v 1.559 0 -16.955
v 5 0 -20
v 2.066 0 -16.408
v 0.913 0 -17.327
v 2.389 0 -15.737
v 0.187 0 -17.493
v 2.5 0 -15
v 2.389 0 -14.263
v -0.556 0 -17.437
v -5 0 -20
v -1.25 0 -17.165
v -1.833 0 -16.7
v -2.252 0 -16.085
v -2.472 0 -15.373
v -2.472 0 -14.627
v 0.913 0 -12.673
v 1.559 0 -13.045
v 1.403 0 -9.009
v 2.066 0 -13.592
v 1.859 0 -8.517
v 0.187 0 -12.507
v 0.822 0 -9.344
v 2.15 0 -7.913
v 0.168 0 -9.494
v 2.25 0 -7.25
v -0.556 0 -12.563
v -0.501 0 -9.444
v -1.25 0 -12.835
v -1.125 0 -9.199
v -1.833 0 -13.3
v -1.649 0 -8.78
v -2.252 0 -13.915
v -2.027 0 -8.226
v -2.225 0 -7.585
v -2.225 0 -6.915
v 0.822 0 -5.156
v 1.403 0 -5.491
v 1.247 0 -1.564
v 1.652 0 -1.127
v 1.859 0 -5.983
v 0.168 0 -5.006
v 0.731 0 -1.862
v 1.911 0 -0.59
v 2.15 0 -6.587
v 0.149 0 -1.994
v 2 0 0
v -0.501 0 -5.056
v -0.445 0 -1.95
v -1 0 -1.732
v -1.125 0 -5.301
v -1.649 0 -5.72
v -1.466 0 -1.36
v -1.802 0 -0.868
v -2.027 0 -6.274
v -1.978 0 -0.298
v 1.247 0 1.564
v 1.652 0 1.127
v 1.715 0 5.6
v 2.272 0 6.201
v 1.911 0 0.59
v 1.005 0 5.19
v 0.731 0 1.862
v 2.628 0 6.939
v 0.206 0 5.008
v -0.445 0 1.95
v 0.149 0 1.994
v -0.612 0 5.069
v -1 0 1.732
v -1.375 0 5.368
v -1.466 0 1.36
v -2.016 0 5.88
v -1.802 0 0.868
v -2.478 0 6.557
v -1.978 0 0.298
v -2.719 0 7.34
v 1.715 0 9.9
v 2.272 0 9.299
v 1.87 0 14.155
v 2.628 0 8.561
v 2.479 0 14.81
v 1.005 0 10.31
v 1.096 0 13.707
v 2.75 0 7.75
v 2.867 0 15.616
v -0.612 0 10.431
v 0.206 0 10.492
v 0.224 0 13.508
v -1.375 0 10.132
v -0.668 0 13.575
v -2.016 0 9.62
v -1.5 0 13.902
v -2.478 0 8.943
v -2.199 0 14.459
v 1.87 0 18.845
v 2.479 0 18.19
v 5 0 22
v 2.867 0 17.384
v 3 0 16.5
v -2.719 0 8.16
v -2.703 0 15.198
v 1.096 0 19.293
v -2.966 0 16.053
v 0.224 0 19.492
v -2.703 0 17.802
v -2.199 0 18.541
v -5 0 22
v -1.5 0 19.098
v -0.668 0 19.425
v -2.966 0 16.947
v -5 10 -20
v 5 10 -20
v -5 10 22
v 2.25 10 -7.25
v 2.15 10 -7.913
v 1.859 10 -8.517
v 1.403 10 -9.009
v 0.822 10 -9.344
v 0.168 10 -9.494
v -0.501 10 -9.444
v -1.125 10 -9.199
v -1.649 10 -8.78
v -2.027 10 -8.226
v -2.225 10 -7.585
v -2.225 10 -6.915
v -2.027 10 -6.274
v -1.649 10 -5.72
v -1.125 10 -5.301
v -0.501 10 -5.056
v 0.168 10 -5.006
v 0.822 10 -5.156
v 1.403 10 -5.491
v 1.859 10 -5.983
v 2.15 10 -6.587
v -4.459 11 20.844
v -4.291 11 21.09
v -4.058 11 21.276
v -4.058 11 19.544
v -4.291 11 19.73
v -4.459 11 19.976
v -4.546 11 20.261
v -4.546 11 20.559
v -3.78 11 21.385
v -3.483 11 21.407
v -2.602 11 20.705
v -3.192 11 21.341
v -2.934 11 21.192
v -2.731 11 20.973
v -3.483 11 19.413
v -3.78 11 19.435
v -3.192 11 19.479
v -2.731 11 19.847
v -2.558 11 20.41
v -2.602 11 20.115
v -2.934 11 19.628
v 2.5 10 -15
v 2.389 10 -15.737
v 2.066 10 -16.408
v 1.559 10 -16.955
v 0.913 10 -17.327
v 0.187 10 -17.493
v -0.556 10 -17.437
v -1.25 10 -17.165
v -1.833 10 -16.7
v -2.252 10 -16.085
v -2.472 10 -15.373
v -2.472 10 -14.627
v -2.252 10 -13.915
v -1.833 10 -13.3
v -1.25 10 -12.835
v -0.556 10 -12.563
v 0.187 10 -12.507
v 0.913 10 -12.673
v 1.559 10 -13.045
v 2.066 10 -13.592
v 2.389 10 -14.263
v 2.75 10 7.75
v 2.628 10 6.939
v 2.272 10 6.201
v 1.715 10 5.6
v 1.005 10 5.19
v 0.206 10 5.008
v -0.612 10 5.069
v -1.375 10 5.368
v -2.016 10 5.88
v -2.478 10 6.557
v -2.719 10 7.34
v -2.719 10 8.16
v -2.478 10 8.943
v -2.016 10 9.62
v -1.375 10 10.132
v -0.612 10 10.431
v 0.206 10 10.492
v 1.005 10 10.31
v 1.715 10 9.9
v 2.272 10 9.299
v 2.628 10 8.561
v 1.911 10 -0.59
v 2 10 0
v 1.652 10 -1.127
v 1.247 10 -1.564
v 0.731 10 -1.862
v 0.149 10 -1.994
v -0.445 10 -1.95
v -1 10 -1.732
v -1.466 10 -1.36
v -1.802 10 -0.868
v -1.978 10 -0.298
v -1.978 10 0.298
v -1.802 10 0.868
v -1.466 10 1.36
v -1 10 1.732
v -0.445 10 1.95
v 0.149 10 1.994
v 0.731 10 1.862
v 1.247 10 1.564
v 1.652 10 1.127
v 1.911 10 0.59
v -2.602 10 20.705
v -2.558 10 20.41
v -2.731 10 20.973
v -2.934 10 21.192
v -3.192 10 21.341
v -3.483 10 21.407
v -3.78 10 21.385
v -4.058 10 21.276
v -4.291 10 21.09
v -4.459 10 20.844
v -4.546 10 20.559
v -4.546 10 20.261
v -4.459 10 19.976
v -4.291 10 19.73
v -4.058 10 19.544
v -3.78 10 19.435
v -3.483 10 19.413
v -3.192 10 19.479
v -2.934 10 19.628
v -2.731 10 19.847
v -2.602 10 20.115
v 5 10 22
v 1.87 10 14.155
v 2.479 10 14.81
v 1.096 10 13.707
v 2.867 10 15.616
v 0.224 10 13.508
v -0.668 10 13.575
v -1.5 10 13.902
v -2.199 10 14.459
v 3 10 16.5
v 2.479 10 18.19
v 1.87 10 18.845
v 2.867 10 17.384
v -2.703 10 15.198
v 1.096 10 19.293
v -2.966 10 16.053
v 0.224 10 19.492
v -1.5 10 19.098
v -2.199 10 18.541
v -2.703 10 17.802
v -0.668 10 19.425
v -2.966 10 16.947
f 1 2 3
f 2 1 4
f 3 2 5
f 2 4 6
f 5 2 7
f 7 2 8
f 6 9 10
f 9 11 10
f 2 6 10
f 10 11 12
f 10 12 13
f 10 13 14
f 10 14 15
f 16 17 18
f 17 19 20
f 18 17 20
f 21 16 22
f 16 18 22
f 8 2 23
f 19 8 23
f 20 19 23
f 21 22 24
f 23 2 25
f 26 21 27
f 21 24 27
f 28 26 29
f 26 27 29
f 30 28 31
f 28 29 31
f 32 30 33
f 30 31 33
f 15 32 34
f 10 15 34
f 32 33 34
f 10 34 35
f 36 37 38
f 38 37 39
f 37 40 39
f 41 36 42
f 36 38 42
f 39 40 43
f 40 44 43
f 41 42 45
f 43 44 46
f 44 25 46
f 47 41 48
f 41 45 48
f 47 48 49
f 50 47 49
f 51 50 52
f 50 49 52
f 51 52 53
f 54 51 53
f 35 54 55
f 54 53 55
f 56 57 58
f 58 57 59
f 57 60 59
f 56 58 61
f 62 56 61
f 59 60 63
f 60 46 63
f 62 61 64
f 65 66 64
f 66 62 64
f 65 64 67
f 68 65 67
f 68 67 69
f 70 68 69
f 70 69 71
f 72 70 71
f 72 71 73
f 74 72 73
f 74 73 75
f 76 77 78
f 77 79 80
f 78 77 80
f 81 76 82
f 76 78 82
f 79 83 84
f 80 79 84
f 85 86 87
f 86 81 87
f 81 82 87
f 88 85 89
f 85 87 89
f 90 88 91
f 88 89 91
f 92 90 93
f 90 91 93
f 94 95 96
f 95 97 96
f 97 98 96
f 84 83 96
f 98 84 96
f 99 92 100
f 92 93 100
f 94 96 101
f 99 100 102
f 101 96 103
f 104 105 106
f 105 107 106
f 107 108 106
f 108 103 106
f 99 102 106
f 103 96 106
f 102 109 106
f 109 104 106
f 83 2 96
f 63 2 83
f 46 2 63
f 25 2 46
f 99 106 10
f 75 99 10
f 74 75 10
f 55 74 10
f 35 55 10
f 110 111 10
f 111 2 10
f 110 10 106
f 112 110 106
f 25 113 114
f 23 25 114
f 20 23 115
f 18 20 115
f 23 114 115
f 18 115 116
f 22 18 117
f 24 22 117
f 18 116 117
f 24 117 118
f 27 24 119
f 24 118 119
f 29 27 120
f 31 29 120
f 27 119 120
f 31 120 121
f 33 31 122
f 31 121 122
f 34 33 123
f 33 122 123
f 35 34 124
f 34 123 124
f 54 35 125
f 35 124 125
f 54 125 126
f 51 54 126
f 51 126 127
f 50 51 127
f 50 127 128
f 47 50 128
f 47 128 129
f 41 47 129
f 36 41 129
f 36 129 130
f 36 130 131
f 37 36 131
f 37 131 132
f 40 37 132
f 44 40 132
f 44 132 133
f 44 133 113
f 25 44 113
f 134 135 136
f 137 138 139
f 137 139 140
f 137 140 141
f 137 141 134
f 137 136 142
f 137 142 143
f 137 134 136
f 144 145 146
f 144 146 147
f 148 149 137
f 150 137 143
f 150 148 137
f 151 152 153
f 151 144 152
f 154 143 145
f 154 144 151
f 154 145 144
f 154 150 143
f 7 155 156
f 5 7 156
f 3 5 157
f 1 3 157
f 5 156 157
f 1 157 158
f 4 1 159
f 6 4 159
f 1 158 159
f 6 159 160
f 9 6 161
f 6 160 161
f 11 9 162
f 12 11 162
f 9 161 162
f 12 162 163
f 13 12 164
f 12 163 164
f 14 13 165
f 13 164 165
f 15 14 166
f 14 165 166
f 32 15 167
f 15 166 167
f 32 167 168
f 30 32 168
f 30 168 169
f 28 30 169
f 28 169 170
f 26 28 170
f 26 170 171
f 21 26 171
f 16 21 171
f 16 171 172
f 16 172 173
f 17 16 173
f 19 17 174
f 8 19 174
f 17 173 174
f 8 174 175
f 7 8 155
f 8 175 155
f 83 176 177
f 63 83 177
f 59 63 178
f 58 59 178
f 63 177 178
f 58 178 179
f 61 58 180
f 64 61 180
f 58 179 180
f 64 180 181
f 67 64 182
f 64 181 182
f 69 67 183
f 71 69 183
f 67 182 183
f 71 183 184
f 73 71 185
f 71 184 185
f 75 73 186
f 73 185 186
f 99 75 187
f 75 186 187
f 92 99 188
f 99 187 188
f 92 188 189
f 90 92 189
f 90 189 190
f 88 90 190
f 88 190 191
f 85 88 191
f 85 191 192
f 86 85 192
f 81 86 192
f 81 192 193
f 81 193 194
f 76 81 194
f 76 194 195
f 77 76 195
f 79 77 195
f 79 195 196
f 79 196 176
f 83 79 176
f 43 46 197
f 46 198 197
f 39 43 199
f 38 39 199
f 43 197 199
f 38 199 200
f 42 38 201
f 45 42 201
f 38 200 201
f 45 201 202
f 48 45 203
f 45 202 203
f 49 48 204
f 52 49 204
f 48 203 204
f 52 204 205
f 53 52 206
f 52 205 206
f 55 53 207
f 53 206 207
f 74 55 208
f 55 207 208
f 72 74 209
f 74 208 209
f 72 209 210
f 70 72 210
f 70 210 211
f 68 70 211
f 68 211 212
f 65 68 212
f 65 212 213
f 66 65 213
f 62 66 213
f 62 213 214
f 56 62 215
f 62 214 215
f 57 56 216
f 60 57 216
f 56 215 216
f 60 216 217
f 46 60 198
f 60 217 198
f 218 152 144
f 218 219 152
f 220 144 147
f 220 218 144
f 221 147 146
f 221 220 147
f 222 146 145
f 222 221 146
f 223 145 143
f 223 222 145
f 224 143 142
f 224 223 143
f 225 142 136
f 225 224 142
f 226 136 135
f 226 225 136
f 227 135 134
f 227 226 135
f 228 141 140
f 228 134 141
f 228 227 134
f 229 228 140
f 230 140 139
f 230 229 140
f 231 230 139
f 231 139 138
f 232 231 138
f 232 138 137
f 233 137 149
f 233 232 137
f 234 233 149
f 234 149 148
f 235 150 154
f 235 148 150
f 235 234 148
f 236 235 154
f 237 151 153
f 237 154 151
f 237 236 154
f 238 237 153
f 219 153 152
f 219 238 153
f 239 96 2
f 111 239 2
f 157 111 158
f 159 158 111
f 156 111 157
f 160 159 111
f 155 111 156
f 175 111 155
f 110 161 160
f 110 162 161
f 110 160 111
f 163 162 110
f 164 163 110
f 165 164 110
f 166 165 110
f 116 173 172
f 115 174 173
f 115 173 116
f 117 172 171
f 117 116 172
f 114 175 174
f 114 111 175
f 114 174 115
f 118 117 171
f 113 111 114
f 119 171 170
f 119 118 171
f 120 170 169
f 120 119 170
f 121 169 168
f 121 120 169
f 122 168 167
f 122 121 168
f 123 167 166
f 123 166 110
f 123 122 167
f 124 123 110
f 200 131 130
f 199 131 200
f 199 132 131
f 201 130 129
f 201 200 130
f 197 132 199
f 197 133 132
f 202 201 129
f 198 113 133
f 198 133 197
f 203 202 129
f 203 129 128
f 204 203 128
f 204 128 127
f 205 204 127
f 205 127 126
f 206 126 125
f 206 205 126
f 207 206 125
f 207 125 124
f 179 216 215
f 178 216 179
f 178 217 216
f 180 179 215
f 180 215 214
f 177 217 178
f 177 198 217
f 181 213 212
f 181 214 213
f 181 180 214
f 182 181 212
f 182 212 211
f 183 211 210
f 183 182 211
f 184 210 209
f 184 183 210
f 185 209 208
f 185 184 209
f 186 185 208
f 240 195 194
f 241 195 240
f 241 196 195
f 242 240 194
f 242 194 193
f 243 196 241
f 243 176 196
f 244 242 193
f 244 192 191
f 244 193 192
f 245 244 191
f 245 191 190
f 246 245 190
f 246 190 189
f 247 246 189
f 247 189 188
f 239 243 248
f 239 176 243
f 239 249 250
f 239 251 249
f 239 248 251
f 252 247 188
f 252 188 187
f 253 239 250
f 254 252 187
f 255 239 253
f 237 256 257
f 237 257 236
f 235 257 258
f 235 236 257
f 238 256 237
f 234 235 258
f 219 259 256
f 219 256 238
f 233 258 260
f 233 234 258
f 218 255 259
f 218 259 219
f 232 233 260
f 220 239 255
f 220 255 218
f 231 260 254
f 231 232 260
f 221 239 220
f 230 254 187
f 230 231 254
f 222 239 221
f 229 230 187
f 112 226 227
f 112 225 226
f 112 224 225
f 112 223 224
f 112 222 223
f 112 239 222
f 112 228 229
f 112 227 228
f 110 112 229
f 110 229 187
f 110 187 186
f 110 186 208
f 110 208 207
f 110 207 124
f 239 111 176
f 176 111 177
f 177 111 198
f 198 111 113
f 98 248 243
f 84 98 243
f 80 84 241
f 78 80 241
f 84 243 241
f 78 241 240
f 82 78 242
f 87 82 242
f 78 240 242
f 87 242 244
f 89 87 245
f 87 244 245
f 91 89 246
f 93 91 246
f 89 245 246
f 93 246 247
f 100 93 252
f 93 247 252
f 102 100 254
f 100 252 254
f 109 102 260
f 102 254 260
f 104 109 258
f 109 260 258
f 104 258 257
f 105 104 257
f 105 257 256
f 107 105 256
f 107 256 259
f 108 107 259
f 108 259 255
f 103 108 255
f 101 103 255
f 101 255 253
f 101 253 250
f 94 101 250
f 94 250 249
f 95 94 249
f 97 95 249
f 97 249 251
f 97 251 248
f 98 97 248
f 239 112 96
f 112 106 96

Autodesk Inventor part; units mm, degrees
ref_plane "YZ Plane" through (0, 0, 0) normal (1, 0, 0) x (0, 1, 0)
ref_plane "XZ Plane" through (0, 0, 0) normal (0, 1, 0) x (-1, 0, 0)
ref_plane "XY Plane" through (0, 0, 0) normal (0, 0, 1) x (1, 0, 0)
sketch "Sketch1" plane through (0, 0, 0) normal (0, 1, 0) x (-1, 0, 0)
  line L0 (5, 22) -> (-5, 22)
  line L1 (-5, 22) -> (-5, -20)
  line L2 (-5, -20) -> (5, -20)
  line L3 (5, -20) -> (5, 22)
  line L4 (0, 0) -> (5, 1) construction
  line L5 (0, 0) -> (-5, 1) construction
  line L6 (0, 0) -> (0, 22) construction
  line L7 (0, 0) -> (0, -20) construction
  dimension "d28" = 5
  dimension "d29" = 5
  dimension "d30" = 20
  dimension "d31" = 22
extrude "Extrusion1" add sketch "Sketch1" along normal blind 10
sketch "Sketch4" plane through (0, 10, 0) normal (0, 1, 0) x (1, 0, 0)
  circle A0 centre (0, 0) radius 2
  line L0 (0, 2) -> (0, 5) construction
  line L1 (0, 5) -> (0, 7.25) construction
  circle A1 centre (0, 7.25) radius 2.25
  line L2 (0, 9.5) -> (0, 15) construction
  circle A2 centre (0, 15) radius 2.5
  line L3 (0, -2) -> (0, -7.75) construction
  circle A3 centre (0, -7.75) radius 2.75
  line L4 (0, -10.5) -> (0, -16.5) construction
  circle A4 centre (0, -16.5) radius 3
  dimension "d19" = 4.5
  dimension "d23" = 5.5
  dimension "d16" = 4
  dimension "d17" = 3
  dimension "d18" = 2.25
  dimension "d20" = 5.5
  dimension "d21" = 5
  dimension "d22" = 5.75
  dimension "d24" = 6
  dimension "d25" = 6
extrude "Extrusion2" cut sketch "Sketch4" against normal through all
sketch "Sketch6" plane through (0, 10, 0) normal (0, 1, 0) x (1, 0, 0)
  circle A0 centre (-3.5576, -20.41) radius 1
  point P0 (0, 0)
  dimension "d32" = 2
extrude "Extrusion3" add sketch "Sketch6" along normal blind 1
properties part number "M4 test"
